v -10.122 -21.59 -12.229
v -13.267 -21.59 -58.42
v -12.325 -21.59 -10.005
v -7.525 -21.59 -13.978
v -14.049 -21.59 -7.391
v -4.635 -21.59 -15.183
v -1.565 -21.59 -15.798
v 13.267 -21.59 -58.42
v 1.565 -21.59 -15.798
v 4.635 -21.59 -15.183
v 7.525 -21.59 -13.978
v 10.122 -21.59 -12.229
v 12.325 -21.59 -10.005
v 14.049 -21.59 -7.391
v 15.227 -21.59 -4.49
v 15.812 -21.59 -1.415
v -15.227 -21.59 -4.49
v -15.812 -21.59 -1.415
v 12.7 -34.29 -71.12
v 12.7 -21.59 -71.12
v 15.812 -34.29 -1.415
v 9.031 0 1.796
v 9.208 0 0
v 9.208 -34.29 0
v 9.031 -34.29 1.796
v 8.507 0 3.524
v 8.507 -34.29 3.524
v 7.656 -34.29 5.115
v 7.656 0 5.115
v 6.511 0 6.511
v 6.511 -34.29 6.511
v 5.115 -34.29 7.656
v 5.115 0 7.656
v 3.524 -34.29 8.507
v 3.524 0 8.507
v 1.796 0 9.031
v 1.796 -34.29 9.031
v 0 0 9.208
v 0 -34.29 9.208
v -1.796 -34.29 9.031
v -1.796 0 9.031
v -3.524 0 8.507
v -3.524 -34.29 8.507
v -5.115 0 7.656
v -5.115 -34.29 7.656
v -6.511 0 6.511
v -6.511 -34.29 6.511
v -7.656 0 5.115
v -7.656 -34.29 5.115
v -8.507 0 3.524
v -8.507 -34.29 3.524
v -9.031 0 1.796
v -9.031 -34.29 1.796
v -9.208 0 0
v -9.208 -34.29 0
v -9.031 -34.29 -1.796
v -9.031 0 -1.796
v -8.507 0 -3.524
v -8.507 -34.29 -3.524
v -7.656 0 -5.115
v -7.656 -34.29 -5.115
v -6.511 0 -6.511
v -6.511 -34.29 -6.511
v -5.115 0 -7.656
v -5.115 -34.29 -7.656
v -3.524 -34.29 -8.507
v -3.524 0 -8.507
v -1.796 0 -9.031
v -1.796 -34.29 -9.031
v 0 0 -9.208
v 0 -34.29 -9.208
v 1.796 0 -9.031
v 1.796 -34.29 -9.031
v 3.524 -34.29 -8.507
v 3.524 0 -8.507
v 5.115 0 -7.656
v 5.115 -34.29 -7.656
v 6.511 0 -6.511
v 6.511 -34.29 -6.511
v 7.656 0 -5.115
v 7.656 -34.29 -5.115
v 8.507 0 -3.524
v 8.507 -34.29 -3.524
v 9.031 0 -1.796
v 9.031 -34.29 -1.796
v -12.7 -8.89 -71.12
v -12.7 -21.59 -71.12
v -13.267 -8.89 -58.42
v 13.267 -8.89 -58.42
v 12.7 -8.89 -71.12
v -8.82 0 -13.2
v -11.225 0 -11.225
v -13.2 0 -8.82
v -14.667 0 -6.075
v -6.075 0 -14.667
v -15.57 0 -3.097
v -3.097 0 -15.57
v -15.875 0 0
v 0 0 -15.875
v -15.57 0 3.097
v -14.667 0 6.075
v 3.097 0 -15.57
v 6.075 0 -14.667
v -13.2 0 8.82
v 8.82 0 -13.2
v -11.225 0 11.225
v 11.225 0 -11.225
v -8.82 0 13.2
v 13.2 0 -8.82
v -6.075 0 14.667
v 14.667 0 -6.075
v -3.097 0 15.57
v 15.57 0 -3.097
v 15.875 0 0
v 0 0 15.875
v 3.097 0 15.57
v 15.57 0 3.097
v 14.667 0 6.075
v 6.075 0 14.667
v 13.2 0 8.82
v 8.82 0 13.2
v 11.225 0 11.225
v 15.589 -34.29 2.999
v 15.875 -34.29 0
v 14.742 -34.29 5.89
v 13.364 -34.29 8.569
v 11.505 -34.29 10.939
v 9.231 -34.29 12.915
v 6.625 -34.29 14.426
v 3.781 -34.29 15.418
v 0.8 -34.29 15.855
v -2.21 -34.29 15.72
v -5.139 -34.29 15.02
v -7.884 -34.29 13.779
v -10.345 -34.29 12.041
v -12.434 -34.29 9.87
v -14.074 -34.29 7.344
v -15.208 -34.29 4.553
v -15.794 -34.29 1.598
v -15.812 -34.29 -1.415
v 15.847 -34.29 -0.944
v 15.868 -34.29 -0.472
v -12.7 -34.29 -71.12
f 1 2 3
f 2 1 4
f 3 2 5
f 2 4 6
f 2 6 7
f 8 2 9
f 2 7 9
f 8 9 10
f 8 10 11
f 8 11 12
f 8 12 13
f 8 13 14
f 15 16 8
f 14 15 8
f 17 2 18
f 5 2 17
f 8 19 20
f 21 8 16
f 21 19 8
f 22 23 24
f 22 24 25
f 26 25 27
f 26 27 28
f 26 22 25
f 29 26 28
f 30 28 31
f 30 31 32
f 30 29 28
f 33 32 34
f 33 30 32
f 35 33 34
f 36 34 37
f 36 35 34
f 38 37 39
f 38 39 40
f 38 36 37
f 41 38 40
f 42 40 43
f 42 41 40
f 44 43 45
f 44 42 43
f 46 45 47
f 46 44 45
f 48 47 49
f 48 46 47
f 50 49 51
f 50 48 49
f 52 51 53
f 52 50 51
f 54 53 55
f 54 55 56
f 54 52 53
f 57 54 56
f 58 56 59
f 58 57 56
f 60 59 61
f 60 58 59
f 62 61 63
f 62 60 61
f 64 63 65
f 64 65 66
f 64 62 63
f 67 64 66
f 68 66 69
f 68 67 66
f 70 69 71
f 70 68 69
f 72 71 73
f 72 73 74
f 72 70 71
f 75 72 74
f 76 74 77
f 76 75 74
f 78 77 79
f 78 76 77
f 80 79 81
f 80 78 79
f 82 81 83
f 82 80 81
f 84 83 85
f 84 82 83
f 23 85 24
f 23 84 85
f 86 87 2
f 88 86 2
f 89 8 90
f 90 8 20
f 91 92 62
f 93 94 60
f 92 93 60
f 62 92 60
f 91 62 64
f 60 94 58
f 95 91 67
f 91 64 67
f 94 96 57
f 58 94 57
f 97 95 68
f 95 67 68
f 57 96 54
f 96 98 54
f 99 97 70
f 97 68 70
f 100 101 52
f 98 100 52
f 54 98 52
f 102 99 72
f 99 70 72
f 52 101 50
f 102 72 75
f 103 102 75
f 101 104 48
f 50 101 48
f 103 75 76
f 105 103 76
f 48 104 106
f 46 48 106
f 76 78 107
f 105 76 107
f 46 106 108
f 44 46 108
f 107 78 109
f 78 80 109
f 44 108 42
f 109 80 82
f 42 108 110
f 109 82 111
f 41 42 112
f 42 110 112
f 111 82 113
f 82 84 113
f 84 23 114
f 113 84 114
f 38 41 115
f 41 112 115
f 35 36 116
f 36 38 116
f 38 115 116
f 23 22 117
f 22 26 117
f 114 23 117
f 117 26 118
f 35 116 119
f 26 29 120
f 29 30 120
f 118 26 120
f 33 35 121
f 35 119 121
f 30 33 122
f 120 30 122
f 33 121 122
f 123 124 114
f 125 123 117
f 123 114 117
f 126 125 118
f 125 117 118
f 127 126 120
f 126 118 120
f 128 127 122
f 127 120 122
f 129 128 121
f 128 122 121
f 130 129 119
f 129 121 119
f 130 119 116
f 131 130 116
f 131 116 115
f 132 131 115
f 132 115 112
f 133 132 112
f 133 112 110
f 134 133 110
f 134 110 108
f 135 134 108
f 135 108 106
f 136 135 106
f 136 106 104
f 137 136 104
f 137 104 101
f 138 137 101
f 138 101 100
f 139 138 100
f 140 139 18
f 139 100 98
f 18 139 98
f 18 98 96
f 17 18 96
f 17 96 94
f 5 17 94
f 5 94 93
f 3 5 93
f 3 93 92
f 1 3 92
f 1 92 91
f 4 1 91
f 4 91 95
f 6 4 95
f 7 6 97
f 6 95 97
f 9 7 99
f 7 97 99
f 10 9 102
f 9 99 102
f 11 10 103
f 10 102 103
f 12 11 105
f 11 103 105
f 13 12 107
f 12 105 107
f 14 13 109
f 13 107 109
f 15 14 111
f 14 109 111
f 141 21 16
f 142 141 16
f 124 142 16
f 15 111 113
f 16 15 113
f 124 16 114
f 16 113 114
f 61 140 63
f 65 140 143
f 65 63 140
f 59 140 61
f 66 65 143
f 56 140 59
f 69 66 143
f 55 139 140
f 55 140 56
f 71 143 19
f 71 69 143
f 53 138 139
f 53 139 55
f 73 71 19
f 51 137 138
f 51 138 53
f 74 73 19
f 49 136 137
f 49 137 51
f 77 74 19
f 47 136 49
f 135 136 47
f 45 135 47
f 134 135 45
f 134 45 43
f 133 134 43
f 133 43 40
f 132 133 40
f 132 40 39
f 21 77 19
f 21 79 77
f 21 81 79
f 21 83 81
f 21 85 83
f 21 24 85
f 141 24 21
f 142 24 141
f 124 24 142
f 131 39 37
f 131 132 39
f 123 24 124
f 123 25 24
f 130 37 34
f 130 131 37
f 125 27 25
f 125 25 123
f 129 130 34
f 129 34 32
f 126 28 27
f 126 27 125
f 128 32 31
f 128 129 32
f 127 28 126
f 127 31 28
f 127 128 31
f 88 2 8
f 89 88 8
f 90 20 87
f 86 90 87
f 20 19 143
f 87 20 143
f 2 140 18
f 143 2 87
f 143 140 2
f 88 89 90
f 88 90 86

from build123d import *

# Parameters (mm, degrees)
F0_R     = 15.875
F0_R_2   = 9.2075
F1_DEPTH = 34.29
F3_DEPTH = 12.7
F5_DEPTH = 12.7


with BuildPart() as f1:
    # F0 (on Front) → F1 (new body)
    with BuildSketch(Plane.XZ):
        Circle(F0_R)
        Circle(F0_R_2, mode=Mode.SUBTRACT)
    extrude(amount=F1_DEPTH)

    # F2 (on face) → F3 (join)
    with BuildSketch(Plane.XZ.offset(34.29)):
        with BuildLine():
            ThreePointArc((15.8118485958, -1.4145914552), (15.8592042905, -0.7080001915), (15.875, 0))
            Line((15.875, 0), (15.8118485958, -1.4145914552))
        make_face()
        with BuildLine():
            ThreePointArc((-15.875, 0), (-15.8592042905, -0.7080001915), (-15.8118485958, -1.4145914552))
            Line((-15.8118485958, -1.4145914552), (-15.875, 0))
        make_face()
        with BuildLine():
            Line((12.7, -71.12), (15.8118485958, -1.4145914552))
            ThreePointArc((15.8118485958, -1.4145914552), (0, -15.875), (-15.8118485958, -1.4145914552))
            Line((-15.8118485958, -1.4145914552), (-12.7, -71.12))
            Line((-12.7, -71.12), (12.7, -71.12))
        make_face()
    extrude(amount=-F3_DEPTH)

    # F4 (on face) → F5 (join)
    with BuildSketch(Plane(origin=(0, -21.59, 0), x_dir=(-1, 0, 0), z_dir=(0, 1, 0))):
        Polygon((-13.2669642857, -58.42), (-12.7, -71.12), (12.7, -71.12), (13.2669642857, -58.42), align=None)
    extrude(amount=F5_DEPTH)


solid = f1.part
